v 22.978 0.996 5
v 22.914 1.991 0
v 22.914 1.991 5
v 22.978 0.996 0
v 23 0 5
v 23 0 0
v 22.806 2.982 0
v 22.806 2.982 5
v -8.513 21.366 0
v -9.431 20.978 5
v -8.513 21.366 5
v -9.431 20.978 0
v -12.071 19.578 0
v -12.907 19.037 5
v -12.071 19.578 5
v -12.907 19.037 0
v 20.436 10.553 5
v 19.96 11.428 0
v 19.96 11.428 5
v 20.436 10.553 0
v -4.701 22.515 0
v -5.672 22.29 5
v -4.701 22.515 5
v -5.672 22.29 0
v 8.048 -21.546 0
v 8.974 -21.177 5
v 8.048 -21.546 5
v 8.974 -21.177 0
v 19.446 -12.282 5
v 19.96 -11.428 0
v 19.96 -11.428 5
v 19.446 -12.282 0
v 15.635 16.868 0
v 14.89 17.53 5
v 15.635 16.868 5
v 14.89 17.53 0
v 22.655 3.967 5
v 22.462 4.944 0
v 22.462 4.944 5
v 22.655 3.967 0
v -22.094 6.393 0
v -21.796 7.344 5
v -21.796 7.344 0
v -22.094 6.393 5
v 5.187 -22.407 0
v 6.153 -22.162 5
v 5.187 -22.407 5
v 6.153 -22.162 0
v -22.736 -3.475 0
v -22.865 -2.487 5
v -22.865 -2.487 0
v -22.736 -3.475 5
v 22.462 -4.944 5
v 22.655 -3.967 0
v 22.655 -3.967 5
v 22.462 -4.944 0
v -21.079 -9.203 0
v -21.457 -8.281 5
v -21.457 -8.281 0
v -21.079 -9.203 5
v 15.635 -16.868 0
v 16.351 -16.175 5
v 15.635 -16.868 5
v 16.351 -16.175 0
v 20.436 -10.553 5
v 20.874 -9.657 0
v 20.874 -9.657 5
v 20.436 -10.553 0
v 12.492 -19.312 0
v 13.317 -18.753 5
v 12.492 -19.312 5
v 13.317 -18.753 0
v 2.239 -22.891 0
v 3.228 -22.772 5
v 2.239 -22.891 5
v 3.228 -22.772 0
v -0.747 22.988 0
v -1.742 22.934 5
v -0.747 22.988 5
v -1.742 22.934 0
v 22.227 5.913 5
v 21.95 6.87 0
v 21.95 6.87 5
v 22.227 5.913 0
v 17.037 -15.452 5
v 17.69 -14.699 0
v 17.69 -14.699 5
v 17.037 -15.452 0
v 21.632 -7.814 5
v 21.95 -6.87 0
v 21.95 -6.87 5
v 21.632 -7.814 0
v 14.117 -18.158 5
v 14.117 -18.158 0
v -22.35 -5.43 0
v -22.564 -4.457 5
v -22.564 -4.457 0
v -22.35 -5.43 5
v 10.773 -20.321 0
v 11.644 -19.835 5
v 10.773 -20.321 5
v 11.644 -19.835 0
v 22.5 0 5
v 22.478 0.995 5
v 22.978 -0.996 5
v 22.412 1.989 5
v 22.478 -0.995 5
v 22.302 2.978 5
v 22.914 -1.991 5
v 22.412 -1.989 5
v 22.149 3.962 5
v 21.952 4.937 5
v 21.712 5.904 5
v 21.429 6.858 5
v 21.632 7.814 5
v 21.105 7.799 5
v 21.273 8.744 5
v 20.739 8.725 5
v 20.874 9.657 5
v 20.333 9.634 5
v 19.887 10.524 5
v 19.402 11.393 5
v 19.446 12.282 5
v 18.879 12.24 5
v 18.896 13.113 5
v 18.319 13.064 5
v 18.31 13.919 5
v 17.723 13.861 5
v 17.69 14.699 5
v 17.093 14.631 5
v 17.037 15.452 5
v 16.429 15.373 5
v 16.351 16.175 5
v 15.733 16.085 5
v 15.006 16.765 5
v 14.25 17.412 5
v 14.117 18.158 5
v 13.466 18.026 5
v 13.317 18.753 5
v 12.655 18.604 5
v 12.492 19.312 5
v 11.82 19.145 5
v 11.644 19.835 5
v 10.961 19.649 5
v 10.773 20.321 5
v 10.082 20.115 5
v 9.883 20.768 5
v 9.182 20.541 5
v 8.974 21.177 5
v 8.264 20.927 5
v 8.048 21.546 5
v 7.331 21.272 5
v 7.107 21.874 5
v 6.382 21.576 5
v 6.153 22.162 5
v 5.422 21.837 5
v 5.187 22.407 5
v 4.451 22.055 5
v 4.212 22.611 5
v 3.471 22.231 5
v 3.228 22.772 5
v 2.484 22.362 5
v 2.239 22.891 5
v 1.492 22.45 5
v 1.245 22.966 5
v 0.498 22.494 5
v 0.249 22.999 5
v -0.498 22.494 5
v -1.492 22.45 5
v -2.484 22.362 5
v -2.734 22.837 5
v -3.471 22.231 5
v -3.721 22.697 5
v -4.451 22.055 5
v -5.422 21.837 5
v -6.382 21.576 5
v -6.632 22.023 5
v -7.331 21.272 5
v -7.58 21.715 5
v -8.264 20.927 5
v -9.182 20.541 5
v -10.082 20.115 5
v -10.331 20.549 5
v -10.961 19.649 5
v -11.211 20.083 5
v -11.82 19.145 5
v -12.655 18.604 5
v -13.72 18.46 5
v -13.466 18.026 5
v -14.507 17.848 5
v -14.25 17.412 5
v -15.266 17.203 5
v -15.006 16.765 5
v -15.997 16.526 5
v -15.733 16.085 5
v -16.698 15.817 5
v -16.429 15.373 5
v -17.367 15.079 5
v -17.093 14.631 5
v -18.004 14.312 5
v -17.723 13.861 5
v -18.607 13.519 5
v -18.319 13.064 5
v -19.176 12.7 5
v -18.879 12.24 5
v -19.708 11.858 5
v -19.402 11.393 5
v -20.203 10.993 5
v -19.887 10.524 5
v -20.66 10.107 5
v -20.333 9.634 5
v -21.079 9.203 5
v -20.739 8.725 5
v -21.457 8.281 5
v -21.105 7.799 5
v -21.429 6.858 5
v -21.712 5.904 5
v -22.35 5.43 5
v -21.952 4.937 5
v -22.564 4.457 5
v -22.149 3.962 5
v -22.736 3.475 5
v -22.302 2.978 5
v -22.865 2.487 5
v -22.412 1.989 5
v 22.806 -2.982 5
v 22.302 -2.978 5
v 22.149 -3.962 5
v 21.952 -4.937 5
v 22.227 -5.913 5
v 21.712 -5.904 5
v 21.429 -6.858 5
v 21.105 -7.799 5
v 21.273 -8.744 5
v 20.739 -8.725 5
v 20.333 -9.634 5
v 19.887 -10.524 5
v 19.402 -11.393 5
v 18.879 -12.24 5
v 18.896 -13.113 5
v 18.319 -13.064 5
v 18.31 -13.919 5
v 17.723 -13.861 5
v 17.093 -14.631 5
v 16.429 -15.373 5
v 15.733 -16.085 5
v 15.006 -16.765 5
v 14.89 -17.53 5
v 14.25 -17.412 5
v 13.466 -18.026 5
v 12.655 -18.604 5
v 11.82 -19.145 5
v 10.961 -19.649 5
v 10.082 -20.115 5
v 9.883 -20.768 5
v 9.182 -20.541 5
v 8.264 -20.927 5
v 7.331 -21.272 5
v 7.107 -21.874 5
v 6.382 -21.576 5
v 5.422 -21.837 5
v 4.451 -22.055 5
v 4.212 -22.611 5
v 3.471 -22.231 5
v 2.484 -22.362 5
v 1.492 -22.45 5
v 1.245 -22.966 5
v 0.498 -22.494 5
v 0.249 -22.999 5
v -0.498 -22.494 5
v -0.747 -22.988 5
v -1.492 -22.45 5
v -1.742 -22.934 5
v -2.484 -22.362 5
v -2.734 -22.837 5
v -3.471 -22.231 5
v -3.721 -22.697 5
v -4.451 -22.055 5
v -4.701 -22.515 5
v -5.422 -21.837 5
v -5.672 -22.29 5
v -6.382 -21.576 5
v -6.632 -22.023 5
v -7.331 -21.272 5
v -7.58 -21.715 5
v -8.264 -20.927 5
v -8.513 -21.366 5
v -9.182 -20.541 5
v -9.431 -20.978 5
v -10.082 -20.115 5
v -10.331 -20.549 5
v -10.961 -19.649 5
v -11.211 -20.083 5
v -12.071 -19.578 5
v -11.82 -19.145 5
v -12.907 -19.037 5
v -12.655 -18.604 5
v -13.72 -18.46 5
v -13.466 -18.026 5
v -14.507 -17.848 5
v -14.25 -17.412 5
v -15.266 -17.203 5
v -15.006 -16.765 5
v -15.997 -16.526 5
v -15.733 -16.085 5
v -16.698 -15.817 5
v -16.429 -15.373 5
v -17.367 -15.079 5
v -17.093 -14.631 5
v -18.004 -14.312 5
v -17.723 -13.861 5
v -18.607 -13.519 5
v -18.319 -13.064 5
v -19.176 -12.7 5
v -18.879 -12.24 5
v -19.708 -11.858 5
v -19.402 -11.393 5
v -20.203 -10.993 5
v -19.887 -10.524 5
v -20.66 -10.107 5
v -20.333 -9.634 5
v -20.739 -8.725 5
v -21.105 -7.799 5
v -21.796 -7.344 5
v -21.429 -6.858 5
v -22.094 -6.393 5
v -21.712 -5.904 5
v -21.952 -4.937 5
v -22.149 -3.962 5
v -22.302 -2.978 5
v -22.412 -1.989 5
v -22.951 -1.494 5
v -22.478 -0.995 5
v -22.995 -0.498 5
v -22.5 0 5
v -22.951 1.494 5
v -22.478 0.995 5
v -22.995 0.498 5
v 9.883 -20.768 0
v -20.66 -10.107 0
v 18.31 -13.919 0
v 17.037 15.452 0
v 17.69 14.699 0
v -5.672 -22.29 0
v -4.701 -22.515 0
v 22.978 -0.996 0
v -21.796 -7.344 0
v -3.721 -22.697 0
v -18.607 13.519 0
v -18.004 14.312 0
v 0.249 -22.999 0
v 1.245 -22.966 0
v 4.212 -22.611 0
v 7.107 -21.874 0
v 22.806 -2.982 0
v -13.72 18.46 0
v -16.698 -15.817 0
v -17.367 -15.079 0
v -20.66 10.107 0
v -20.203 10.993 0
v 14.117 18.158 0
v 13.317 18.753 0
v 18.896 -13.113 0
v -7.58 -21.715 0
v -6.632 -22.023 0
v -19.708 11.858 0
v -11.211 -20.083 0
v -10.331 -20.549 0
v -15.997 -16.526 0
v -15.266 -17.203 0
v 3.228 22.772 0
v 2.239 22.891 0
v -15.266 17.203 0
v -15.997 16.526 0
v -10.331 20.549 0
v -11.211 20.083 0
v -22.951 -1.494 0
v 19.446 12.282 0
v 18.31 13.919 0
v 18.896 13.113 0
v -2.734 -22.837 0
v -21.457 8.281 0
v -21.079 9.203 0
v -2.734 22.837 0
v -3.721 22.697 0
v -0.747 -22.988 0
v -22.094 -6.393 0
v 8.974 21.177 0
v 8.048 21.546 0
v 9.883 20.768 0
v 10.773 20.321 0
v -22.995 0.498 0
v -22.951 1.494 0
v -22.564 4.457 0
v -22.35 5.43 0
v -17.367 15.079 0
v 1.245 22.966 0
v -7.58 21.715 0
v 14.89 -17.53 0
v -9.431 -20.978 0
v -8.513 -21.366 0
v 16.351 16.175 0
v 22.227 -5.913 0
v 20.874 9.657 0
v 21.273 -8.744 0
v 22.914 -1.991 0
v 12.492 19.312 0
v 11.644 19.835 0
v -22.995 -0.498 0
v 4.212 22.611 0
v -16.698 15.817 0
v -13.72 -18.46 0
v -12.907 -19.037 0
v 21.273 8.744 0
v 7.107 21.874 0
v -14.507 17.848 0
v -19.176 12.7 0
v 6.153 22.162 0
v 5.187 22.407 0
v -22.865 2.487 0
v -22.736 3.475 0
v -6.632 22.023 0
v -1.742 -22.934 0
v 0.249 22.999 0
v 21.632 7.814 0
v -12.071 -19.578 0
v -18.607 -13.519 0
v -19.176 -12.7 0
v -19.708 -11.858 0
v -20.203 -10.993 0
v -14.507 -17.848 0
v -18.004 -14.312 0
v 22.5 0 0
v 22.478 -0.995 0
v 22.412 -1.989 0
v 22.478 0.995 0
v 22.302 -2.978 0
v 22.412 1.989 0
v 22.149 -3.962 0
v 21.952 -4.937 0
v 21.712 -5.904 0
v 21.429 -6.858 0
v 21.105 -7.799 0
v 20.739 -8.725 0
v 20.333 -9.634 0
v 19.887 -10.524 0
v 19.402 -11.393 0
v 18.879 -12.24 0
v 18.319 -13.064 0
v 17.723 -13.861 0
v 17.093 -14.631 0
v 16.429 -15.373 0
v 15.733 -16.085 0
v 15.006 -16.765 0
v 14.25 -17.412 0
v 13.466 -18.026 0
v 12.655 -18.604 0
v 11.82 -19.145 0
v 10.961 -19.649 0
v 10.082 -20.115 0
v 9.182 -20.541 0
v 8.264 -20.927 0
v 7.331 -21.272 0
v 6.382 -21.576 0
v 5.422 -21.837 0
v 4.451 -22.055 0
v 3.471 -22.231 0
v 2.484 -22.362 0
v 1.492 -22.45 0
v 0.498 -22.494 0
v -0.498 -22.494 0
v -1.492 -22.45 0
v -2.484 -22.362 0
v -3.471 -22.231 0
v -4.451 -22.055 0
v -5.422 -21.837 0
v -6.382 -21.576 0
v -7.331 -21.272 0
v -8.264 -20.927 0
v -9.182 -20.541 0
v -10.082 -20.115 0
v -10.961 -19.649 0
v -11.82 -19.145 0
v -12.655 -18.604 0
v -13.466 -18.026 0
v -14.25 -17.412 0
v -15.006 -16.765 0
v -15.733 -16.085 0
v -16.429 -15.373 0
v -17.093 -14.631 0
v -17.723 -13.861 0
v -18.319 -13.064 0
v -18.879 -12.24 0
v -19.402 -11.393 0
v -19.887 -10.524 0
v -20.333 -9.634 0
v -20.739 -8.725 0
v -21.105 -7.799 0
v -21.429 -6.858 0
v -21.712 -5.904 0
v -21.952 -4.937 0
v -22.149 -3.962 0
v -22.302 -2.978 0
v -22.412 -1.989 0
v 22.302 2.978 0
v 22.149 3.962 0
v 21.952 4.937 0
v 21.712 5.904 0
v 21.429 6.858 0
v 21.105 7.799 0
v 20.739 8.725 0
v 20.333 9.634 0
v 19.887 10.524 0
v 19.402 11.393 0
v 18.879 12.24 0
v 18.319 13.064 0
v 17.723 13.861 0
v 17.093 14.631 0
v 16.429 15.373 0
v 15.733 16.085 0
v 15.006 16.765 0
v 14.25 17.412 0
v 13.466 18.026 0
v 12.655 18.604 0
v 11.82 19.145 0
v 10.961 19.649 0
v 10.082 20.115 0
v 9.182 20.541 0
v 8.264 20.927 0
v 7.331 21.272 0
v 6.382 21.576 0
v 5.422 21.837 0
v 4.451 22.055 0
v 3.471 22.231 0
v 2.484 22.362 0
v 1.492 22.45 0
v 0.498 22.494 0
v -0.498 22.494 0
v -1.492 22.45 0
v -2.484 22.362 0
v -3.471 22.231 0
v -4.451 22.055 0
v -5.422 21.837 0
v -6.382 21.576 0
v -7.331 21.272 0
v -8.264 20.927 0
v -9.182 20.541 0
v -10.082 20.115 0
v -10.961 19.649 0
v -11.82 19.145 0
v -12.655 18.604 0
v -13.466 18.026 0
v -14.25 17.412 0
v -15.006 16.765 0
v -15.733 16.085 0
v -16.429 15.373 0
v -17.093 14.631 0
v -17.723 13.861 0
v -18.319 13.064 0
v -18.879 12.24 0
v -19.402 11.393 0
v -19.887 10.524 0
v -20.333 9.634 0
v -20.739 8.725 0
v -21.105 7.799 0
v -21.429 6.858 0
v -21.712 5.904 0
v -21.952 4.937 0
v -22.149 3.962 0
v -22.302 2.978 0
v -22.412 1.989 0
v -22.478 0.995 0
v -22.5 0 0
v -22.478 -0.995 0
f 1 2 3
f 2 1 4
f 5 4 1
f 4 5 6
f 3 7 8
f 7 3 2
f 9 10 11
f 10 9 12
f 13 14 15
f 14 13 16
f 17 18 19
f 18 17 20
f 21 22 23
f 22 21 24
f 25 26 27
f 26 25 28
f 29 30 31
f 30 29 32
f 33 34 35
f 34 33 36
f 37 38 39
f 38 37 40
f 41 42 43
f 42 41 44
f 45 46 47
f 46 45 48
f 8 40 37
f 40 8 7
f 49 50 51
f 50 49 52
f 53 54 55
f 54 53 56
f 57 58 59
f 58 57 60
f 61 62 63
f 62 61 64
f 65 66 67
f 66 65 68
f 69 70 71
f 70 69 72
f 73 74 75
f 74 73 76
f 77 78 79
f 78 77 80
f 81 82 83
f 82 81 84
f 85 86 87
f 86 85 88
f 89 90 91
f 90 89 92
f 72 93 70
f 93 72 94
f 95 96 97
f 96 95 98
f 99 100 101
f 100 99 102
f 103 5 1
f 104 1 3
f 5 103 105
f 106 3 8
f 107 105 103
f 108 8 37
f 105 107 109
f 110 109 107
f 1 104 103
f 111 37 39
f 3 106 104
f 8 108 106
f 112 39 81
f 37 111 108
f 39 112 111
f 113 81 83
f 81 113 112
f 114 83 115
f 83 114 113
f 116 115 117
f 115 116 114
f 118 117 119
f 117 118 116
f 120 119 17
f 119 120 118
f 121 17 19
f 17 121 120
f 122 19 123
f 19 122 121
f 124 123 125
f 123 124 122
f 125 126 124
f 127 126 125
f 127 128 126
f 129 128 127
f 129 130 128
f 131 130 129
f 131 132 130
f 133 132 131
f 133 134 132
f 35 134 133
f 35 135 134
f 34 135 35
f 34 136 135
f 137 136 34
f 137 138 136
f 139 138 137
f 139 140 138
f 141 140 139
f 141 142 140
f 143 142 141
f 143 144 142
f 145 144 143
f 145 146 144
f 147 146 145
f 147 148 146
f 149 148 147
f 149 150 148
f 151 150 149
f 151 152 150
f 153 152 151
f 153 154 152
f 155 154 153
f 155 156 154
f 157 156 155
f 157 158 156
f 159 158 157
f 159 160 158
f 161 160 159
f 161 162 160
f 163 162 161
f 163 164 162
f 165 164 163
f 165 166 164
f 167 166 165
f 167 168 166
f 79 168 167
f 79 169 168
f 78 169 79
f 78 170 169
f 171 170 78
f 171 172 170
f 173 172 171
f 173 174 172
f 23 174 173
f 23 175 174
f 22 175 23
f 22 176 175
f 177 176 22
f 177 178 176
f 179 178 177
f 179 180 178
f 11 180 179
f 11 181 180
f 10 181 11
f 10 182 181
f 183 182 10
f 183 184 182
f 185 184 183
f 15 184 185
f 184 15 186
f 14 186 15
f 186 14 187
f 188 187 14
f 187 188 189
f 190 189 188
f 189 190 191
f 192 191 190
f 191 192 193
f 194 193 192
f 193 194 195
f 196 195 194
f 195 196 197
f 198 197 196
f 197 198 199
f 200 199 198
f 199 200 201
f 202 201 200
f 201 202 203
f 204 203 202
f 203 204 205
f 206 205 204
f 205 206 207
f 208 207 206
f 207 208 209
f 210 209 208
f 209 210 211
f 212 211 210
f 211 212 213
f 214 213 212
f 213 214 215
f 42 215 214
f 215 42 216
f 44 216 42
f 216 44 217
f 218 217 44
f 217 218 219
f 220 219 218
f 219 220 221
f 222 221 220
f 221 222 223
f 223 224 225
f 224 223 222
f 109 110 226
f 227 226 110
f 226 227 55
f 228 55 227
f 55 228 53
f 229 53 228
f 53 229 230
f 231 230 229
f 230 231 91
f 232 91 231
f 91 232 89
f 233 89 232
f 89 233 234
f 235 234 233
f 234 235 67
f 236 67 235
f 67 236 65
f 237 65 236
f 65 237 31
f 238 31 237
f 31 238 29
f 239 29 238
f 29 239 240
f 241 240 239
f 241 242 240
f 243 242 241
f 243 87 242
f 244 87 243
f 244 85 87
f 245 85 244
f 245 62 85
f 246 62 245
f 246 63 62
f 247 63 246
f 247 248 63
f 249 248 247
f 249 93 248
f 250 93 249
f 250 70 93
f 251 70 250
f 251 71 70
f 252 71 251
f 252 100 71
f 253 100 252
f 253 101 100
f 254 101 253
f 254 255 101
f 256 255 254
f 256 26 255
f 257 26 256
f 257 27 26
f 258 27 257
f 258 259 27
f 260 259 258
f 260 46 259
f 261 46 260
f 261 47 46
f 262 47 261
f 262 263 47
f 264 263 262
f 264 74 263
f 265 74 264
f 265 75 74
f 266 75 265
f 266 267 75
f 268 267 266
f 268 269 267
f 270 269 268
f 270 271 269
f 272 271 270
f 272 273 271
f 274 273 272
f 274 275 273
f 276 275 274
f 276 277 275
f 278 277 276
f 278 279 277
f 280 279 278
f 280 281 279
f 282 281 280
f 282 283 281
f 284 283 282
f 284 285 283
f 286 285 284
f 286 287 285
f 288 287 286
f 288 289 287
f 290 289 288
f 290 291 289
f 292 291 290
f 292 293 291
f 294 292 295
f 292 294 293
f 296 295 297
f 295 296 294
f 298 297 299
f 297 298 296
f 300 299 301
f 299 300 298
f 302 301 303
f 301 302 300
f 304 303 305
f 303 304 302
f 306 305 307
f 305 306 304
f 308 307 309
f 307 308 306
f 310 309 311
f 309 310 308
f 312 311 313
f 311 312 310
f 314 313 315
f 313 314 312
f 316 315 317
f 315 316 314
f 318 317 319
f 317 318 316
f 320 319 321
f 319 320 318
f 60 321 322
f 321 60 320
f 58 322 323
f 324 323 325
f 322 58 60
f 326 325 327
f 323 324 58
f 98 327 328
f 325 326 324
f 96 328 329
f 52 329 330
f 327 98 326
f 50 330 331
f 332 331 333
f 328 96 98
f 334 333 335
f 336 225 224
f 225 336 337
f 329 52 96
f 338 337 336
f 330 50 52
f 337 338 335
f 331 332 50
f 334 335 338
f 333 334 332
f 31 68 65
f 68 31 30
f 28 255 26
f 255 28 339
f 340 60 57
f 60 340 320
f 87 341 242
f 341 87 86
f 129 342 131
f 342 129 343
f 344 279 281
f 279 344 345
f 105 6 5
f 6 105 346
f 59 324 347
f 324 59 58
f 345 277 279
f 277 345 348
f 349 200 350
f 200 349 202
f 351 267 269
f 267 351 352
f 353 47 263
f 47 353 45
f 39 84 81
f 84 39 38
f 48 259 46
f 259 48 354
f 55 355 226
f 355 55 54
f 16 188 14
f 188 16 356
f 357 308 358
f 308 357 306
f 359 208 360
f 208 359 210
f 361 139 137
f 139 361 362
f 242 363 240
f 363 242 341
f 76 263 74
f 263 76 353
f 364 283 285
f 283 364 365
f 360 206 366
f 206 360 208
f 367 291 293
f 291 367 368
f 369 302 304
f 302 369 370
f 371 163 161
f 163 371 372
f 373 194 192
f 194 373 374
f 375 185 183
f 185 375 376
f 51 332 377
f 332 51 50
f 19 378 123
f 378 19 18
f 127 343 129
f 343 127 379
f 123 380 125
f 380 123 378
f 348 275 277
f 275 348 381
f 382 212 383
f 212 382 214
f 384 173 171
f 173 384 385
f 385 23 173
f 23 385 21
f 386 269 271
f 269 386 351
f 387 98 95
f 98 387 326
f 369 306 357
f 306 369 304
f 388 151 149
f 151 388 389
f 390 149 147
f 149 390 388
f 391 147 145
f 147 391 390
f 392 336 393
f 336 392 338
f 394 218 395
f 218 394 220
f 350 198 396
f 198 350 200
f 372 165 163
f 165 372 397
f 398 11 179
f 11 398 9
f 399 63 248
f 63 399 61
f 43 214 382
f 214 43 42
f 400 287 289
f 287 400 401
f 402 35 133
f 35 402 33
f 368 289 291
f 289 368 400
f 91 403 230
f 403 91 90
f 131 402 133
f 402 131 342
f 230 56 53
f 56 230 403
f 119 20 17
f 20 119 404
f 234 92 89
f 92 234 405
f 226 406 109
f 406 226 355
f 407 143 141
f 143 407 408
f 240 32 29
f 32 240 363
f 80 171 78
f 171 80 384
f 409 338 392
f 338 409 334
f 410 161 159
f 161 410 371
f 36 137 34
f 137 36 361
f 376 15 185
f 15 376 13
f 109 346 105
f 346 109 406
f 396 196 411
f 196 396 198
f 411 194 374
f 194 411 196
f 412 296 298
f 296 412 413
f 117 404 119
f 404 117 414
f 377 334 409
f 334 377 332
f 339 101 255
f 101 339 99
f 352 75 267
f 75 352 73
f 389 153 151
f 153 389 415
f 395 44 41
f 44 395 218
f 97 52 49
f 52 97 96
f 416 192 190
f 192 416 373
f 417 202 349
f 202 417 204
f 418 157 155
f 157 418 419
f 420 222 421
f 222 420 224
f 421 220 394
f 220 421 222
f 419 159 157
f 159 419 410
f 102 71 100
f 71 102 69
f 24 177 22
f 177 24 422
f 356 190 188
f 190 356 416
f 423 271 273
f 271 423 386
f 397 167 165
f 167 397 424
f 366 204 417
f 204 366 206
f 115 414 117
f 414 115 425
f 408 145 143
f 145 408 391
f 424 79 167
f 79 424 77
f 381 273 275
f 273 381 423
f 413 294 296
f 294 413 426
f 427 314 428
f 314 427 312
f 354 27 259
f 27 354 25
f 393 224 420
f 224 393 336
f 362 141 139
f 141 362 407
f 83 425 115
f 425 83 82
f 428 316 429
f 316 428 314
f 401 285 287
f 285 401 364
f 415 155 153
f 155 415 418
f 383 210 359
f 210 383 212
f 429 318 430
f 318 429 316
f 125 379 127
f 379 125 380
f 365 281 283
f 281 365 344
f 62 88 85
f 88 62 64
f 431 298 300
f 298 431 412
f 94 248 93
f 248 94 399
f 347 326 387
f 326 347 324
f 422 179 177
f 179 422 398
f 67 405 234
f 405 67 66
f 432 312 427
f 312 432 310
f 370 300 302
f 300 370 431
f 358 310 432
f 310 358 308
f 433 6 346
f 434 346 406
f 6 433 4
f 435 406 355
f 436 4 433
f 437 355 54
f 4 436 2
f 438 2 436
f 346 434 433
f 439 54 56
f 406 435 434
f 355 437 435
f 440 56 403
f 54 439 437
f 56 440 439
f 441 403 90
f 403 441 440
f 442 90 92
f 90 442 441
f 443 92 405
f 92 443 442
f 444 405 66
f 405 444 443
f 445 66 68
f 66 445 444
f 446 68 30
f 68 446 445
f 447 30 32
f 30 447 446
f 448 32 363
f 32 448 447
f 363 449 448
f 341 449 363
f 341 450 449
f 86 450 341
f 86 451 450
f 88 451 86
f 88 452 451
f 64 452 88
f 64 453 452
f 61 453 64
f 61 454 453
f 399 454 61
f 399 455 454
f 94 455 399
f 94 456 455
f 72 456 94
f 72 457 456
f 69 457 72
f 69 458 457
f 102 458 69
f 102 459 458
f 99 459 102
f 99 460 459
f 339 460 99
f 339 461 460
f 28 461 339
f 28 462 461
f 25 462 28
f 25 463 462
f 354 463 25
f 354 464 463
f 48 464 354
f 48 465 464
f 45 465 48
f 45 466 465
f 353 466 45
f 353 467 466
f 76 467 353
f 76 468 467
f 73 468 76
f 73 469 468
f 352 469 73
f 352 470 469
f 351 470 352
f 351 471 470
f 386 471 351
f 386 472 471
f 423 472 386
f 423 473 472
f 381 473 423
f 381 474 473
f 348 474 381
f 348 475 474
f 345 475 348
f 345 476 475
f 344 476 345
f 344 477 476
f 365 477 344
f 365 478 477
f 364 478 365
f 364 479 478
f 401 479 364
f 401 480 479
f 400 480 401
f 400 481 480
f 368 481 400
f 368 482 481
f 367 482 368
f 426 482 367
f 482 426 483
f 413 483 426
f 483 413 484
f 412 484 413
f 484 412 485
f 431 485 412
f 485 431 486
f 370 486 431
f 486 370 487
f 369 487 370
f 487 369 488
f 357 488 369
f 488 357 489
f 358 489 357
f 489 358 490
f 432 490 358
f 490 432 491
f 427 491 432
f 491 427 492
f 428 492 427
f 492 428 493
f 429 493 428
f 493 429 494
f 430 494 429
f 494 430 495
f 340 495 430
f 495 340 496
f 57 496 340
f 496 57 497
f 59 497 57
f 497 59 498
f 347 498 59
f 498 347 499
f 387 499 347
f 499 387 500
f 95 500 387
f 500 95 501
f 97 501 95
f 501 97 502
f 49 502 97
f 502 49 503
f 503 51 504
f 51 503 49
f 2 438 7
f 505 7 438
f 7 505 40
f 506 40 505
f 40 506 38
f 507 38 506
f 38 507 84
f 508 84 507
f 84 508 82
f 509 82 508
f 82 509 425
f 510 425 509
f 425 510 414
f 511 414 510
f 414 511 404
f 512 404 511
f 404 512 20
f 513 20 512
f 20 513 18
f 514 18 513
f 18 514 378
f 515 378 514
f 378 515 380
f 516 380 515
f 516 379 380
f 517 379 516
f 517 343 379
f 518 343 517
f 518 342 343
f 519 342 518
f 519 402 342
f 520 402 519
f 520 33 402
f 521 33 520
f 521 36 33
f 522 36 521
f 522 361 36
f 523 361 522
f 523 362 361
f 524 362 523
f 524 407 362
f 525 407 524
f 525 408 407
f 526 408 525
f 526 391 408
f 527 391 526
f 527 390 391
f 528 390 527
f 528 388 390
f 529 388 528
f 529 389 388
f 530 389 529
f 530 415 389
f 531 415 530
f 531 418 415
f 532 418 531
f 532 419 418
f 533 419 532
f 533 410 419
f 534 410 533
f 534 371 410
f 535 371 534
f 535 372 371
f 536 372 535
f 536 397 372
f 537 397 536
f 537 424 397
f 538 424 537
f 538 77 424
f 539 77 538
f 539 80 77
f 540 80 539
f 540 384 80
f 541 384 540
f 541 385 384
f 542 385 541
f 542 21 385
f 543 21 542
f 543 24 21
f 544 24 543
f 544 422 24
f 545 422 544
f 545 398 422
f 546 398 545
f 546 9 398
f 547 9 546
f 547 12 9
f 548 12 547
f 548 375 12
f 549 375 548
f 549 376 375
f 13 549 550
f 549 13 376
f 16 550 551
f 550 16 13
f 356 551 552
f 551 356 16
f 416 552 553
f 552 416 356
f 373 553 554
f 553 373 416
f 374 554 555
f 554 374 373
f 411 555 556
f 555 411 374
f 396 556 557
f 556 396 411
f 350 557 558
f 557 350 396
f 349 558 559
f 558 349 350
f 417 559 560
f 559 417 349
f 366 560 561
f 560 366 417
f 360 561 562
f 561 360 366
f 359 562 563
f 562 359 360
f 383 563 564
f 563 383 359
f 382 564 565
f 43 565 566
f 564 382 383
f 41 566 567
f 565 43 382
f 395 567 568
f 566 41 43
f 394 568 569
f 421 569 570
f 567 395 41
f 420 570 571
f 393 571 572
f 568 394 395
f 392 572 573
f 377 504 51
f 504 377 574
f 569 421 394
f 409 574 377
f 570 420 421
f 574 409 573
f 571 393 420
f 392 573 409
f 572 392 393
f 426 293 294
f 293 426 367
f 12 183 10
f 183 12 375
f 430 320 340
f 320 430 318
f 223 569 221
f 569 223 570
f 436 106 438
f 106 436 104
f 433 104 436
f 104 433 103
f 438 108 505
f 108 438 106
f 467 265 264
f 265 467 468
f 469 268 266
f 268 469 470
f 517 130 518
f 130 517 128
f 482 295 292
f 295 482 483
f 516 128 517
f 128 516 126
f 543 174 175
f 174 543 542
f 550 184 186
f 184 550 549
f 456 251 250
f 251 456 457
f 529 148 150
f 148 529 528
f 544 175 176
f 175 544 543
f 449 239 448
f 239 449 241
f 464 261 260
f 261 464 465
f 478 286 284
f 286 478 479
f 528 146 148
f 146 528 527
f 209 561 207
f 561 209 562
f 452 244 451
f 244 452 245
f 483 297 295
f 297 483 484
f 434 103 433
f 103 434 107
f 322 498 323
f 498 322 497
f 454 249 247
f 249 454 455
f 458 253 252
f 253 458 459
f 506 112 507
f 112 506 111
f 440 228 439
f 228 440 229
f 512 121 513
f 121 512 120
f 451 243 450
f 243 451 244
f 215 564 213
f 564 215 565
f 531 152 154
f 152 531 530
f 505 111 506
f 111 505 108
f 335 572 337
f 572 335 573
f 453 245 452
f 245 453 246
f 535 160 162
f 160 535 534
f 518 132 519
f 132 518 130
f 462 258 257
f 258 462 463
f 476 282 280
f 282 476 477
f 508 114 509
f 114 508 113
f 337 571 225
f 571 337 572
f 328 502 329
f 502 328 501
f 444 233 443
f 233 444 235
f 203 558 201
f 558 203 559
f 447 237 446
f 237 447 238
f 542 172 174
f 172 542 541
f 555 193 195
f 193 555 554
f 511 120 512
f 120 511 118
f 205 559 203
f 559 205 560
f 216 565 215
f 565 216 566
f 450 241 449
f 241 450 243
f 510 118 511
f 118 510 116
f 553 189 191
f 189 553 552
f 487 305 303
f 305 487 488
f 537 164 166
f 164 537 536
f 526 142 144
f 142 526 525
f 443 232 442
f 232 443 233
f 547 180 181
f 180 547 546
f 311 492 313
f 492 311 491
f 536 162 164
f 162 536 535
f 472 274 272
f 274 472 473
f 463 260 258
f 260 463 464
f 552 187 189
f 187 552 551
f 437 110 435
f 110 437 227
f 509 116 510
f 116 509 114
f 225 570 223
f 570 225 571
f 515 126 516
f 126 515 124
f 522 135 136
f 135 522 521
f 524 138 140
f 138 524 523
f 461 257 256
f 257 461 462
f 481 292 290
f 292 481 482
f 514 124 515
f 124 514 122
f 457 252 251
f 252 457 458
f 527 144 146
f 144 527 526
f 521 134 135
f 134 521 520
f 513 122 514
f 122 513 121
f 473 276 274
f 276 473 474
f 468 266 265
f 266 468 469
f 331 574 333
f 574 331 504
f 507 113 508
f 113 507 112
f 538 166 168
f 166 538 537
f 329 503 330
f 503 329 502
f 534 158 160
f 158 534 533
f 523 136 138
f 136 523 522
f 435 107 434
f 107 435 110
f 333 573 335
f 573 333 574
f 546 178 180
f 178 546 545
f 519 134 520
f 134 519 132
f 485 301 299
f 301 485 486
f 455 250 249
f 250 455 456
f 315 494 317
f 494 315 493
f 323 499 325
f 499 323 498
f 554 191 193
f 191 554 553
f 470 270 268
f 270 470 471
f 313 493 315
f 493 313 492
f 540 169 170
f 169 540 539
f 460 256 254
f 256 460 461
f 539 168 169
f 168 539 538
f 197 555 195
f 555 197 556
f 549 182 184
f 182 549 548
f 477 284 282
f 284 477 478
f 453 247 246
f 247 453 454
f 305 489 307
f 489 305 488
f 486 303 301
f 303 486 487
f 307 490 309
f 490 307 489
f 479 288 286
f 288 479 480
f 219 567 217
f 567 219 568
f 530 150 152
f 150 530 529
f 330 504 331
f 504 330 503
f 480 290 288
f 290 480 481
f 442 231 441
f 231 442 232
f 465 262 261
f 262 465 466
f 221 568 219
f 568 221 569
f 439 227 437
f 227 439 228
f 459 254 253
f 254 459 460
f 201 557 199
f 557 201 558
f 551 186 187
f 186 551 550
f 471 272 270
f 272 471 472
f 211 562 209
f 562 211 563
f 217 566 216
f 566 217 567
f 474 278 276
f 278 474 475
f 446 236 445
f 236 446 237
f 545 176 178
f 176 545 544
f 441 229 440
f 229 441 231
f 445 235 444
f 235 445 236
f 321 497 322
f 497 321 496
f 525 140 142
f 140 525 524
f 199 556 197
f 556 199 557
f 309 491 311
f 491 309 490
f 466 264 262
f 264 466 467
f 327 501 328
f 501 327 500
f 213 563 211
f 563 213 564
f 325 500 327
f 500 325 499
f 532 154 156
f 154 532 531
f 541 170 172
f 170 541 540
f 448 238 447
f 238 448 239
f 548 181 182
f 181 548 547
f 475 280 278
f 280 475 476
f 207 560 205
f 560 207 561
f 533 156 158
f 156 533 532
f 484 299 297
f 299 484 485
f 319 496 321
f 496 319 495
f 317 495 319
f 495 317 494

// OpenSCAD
/*
 * A little collar that can be printed in multiple colours to identify squeeze bottles.
 */
Diam = 45;
Height = 5;

$fa = 1;
$fs = 1;

difference() {
  cylinder(d=Diam+1, h=Height);
  cylinder(d=Diam, h=Height);
}
